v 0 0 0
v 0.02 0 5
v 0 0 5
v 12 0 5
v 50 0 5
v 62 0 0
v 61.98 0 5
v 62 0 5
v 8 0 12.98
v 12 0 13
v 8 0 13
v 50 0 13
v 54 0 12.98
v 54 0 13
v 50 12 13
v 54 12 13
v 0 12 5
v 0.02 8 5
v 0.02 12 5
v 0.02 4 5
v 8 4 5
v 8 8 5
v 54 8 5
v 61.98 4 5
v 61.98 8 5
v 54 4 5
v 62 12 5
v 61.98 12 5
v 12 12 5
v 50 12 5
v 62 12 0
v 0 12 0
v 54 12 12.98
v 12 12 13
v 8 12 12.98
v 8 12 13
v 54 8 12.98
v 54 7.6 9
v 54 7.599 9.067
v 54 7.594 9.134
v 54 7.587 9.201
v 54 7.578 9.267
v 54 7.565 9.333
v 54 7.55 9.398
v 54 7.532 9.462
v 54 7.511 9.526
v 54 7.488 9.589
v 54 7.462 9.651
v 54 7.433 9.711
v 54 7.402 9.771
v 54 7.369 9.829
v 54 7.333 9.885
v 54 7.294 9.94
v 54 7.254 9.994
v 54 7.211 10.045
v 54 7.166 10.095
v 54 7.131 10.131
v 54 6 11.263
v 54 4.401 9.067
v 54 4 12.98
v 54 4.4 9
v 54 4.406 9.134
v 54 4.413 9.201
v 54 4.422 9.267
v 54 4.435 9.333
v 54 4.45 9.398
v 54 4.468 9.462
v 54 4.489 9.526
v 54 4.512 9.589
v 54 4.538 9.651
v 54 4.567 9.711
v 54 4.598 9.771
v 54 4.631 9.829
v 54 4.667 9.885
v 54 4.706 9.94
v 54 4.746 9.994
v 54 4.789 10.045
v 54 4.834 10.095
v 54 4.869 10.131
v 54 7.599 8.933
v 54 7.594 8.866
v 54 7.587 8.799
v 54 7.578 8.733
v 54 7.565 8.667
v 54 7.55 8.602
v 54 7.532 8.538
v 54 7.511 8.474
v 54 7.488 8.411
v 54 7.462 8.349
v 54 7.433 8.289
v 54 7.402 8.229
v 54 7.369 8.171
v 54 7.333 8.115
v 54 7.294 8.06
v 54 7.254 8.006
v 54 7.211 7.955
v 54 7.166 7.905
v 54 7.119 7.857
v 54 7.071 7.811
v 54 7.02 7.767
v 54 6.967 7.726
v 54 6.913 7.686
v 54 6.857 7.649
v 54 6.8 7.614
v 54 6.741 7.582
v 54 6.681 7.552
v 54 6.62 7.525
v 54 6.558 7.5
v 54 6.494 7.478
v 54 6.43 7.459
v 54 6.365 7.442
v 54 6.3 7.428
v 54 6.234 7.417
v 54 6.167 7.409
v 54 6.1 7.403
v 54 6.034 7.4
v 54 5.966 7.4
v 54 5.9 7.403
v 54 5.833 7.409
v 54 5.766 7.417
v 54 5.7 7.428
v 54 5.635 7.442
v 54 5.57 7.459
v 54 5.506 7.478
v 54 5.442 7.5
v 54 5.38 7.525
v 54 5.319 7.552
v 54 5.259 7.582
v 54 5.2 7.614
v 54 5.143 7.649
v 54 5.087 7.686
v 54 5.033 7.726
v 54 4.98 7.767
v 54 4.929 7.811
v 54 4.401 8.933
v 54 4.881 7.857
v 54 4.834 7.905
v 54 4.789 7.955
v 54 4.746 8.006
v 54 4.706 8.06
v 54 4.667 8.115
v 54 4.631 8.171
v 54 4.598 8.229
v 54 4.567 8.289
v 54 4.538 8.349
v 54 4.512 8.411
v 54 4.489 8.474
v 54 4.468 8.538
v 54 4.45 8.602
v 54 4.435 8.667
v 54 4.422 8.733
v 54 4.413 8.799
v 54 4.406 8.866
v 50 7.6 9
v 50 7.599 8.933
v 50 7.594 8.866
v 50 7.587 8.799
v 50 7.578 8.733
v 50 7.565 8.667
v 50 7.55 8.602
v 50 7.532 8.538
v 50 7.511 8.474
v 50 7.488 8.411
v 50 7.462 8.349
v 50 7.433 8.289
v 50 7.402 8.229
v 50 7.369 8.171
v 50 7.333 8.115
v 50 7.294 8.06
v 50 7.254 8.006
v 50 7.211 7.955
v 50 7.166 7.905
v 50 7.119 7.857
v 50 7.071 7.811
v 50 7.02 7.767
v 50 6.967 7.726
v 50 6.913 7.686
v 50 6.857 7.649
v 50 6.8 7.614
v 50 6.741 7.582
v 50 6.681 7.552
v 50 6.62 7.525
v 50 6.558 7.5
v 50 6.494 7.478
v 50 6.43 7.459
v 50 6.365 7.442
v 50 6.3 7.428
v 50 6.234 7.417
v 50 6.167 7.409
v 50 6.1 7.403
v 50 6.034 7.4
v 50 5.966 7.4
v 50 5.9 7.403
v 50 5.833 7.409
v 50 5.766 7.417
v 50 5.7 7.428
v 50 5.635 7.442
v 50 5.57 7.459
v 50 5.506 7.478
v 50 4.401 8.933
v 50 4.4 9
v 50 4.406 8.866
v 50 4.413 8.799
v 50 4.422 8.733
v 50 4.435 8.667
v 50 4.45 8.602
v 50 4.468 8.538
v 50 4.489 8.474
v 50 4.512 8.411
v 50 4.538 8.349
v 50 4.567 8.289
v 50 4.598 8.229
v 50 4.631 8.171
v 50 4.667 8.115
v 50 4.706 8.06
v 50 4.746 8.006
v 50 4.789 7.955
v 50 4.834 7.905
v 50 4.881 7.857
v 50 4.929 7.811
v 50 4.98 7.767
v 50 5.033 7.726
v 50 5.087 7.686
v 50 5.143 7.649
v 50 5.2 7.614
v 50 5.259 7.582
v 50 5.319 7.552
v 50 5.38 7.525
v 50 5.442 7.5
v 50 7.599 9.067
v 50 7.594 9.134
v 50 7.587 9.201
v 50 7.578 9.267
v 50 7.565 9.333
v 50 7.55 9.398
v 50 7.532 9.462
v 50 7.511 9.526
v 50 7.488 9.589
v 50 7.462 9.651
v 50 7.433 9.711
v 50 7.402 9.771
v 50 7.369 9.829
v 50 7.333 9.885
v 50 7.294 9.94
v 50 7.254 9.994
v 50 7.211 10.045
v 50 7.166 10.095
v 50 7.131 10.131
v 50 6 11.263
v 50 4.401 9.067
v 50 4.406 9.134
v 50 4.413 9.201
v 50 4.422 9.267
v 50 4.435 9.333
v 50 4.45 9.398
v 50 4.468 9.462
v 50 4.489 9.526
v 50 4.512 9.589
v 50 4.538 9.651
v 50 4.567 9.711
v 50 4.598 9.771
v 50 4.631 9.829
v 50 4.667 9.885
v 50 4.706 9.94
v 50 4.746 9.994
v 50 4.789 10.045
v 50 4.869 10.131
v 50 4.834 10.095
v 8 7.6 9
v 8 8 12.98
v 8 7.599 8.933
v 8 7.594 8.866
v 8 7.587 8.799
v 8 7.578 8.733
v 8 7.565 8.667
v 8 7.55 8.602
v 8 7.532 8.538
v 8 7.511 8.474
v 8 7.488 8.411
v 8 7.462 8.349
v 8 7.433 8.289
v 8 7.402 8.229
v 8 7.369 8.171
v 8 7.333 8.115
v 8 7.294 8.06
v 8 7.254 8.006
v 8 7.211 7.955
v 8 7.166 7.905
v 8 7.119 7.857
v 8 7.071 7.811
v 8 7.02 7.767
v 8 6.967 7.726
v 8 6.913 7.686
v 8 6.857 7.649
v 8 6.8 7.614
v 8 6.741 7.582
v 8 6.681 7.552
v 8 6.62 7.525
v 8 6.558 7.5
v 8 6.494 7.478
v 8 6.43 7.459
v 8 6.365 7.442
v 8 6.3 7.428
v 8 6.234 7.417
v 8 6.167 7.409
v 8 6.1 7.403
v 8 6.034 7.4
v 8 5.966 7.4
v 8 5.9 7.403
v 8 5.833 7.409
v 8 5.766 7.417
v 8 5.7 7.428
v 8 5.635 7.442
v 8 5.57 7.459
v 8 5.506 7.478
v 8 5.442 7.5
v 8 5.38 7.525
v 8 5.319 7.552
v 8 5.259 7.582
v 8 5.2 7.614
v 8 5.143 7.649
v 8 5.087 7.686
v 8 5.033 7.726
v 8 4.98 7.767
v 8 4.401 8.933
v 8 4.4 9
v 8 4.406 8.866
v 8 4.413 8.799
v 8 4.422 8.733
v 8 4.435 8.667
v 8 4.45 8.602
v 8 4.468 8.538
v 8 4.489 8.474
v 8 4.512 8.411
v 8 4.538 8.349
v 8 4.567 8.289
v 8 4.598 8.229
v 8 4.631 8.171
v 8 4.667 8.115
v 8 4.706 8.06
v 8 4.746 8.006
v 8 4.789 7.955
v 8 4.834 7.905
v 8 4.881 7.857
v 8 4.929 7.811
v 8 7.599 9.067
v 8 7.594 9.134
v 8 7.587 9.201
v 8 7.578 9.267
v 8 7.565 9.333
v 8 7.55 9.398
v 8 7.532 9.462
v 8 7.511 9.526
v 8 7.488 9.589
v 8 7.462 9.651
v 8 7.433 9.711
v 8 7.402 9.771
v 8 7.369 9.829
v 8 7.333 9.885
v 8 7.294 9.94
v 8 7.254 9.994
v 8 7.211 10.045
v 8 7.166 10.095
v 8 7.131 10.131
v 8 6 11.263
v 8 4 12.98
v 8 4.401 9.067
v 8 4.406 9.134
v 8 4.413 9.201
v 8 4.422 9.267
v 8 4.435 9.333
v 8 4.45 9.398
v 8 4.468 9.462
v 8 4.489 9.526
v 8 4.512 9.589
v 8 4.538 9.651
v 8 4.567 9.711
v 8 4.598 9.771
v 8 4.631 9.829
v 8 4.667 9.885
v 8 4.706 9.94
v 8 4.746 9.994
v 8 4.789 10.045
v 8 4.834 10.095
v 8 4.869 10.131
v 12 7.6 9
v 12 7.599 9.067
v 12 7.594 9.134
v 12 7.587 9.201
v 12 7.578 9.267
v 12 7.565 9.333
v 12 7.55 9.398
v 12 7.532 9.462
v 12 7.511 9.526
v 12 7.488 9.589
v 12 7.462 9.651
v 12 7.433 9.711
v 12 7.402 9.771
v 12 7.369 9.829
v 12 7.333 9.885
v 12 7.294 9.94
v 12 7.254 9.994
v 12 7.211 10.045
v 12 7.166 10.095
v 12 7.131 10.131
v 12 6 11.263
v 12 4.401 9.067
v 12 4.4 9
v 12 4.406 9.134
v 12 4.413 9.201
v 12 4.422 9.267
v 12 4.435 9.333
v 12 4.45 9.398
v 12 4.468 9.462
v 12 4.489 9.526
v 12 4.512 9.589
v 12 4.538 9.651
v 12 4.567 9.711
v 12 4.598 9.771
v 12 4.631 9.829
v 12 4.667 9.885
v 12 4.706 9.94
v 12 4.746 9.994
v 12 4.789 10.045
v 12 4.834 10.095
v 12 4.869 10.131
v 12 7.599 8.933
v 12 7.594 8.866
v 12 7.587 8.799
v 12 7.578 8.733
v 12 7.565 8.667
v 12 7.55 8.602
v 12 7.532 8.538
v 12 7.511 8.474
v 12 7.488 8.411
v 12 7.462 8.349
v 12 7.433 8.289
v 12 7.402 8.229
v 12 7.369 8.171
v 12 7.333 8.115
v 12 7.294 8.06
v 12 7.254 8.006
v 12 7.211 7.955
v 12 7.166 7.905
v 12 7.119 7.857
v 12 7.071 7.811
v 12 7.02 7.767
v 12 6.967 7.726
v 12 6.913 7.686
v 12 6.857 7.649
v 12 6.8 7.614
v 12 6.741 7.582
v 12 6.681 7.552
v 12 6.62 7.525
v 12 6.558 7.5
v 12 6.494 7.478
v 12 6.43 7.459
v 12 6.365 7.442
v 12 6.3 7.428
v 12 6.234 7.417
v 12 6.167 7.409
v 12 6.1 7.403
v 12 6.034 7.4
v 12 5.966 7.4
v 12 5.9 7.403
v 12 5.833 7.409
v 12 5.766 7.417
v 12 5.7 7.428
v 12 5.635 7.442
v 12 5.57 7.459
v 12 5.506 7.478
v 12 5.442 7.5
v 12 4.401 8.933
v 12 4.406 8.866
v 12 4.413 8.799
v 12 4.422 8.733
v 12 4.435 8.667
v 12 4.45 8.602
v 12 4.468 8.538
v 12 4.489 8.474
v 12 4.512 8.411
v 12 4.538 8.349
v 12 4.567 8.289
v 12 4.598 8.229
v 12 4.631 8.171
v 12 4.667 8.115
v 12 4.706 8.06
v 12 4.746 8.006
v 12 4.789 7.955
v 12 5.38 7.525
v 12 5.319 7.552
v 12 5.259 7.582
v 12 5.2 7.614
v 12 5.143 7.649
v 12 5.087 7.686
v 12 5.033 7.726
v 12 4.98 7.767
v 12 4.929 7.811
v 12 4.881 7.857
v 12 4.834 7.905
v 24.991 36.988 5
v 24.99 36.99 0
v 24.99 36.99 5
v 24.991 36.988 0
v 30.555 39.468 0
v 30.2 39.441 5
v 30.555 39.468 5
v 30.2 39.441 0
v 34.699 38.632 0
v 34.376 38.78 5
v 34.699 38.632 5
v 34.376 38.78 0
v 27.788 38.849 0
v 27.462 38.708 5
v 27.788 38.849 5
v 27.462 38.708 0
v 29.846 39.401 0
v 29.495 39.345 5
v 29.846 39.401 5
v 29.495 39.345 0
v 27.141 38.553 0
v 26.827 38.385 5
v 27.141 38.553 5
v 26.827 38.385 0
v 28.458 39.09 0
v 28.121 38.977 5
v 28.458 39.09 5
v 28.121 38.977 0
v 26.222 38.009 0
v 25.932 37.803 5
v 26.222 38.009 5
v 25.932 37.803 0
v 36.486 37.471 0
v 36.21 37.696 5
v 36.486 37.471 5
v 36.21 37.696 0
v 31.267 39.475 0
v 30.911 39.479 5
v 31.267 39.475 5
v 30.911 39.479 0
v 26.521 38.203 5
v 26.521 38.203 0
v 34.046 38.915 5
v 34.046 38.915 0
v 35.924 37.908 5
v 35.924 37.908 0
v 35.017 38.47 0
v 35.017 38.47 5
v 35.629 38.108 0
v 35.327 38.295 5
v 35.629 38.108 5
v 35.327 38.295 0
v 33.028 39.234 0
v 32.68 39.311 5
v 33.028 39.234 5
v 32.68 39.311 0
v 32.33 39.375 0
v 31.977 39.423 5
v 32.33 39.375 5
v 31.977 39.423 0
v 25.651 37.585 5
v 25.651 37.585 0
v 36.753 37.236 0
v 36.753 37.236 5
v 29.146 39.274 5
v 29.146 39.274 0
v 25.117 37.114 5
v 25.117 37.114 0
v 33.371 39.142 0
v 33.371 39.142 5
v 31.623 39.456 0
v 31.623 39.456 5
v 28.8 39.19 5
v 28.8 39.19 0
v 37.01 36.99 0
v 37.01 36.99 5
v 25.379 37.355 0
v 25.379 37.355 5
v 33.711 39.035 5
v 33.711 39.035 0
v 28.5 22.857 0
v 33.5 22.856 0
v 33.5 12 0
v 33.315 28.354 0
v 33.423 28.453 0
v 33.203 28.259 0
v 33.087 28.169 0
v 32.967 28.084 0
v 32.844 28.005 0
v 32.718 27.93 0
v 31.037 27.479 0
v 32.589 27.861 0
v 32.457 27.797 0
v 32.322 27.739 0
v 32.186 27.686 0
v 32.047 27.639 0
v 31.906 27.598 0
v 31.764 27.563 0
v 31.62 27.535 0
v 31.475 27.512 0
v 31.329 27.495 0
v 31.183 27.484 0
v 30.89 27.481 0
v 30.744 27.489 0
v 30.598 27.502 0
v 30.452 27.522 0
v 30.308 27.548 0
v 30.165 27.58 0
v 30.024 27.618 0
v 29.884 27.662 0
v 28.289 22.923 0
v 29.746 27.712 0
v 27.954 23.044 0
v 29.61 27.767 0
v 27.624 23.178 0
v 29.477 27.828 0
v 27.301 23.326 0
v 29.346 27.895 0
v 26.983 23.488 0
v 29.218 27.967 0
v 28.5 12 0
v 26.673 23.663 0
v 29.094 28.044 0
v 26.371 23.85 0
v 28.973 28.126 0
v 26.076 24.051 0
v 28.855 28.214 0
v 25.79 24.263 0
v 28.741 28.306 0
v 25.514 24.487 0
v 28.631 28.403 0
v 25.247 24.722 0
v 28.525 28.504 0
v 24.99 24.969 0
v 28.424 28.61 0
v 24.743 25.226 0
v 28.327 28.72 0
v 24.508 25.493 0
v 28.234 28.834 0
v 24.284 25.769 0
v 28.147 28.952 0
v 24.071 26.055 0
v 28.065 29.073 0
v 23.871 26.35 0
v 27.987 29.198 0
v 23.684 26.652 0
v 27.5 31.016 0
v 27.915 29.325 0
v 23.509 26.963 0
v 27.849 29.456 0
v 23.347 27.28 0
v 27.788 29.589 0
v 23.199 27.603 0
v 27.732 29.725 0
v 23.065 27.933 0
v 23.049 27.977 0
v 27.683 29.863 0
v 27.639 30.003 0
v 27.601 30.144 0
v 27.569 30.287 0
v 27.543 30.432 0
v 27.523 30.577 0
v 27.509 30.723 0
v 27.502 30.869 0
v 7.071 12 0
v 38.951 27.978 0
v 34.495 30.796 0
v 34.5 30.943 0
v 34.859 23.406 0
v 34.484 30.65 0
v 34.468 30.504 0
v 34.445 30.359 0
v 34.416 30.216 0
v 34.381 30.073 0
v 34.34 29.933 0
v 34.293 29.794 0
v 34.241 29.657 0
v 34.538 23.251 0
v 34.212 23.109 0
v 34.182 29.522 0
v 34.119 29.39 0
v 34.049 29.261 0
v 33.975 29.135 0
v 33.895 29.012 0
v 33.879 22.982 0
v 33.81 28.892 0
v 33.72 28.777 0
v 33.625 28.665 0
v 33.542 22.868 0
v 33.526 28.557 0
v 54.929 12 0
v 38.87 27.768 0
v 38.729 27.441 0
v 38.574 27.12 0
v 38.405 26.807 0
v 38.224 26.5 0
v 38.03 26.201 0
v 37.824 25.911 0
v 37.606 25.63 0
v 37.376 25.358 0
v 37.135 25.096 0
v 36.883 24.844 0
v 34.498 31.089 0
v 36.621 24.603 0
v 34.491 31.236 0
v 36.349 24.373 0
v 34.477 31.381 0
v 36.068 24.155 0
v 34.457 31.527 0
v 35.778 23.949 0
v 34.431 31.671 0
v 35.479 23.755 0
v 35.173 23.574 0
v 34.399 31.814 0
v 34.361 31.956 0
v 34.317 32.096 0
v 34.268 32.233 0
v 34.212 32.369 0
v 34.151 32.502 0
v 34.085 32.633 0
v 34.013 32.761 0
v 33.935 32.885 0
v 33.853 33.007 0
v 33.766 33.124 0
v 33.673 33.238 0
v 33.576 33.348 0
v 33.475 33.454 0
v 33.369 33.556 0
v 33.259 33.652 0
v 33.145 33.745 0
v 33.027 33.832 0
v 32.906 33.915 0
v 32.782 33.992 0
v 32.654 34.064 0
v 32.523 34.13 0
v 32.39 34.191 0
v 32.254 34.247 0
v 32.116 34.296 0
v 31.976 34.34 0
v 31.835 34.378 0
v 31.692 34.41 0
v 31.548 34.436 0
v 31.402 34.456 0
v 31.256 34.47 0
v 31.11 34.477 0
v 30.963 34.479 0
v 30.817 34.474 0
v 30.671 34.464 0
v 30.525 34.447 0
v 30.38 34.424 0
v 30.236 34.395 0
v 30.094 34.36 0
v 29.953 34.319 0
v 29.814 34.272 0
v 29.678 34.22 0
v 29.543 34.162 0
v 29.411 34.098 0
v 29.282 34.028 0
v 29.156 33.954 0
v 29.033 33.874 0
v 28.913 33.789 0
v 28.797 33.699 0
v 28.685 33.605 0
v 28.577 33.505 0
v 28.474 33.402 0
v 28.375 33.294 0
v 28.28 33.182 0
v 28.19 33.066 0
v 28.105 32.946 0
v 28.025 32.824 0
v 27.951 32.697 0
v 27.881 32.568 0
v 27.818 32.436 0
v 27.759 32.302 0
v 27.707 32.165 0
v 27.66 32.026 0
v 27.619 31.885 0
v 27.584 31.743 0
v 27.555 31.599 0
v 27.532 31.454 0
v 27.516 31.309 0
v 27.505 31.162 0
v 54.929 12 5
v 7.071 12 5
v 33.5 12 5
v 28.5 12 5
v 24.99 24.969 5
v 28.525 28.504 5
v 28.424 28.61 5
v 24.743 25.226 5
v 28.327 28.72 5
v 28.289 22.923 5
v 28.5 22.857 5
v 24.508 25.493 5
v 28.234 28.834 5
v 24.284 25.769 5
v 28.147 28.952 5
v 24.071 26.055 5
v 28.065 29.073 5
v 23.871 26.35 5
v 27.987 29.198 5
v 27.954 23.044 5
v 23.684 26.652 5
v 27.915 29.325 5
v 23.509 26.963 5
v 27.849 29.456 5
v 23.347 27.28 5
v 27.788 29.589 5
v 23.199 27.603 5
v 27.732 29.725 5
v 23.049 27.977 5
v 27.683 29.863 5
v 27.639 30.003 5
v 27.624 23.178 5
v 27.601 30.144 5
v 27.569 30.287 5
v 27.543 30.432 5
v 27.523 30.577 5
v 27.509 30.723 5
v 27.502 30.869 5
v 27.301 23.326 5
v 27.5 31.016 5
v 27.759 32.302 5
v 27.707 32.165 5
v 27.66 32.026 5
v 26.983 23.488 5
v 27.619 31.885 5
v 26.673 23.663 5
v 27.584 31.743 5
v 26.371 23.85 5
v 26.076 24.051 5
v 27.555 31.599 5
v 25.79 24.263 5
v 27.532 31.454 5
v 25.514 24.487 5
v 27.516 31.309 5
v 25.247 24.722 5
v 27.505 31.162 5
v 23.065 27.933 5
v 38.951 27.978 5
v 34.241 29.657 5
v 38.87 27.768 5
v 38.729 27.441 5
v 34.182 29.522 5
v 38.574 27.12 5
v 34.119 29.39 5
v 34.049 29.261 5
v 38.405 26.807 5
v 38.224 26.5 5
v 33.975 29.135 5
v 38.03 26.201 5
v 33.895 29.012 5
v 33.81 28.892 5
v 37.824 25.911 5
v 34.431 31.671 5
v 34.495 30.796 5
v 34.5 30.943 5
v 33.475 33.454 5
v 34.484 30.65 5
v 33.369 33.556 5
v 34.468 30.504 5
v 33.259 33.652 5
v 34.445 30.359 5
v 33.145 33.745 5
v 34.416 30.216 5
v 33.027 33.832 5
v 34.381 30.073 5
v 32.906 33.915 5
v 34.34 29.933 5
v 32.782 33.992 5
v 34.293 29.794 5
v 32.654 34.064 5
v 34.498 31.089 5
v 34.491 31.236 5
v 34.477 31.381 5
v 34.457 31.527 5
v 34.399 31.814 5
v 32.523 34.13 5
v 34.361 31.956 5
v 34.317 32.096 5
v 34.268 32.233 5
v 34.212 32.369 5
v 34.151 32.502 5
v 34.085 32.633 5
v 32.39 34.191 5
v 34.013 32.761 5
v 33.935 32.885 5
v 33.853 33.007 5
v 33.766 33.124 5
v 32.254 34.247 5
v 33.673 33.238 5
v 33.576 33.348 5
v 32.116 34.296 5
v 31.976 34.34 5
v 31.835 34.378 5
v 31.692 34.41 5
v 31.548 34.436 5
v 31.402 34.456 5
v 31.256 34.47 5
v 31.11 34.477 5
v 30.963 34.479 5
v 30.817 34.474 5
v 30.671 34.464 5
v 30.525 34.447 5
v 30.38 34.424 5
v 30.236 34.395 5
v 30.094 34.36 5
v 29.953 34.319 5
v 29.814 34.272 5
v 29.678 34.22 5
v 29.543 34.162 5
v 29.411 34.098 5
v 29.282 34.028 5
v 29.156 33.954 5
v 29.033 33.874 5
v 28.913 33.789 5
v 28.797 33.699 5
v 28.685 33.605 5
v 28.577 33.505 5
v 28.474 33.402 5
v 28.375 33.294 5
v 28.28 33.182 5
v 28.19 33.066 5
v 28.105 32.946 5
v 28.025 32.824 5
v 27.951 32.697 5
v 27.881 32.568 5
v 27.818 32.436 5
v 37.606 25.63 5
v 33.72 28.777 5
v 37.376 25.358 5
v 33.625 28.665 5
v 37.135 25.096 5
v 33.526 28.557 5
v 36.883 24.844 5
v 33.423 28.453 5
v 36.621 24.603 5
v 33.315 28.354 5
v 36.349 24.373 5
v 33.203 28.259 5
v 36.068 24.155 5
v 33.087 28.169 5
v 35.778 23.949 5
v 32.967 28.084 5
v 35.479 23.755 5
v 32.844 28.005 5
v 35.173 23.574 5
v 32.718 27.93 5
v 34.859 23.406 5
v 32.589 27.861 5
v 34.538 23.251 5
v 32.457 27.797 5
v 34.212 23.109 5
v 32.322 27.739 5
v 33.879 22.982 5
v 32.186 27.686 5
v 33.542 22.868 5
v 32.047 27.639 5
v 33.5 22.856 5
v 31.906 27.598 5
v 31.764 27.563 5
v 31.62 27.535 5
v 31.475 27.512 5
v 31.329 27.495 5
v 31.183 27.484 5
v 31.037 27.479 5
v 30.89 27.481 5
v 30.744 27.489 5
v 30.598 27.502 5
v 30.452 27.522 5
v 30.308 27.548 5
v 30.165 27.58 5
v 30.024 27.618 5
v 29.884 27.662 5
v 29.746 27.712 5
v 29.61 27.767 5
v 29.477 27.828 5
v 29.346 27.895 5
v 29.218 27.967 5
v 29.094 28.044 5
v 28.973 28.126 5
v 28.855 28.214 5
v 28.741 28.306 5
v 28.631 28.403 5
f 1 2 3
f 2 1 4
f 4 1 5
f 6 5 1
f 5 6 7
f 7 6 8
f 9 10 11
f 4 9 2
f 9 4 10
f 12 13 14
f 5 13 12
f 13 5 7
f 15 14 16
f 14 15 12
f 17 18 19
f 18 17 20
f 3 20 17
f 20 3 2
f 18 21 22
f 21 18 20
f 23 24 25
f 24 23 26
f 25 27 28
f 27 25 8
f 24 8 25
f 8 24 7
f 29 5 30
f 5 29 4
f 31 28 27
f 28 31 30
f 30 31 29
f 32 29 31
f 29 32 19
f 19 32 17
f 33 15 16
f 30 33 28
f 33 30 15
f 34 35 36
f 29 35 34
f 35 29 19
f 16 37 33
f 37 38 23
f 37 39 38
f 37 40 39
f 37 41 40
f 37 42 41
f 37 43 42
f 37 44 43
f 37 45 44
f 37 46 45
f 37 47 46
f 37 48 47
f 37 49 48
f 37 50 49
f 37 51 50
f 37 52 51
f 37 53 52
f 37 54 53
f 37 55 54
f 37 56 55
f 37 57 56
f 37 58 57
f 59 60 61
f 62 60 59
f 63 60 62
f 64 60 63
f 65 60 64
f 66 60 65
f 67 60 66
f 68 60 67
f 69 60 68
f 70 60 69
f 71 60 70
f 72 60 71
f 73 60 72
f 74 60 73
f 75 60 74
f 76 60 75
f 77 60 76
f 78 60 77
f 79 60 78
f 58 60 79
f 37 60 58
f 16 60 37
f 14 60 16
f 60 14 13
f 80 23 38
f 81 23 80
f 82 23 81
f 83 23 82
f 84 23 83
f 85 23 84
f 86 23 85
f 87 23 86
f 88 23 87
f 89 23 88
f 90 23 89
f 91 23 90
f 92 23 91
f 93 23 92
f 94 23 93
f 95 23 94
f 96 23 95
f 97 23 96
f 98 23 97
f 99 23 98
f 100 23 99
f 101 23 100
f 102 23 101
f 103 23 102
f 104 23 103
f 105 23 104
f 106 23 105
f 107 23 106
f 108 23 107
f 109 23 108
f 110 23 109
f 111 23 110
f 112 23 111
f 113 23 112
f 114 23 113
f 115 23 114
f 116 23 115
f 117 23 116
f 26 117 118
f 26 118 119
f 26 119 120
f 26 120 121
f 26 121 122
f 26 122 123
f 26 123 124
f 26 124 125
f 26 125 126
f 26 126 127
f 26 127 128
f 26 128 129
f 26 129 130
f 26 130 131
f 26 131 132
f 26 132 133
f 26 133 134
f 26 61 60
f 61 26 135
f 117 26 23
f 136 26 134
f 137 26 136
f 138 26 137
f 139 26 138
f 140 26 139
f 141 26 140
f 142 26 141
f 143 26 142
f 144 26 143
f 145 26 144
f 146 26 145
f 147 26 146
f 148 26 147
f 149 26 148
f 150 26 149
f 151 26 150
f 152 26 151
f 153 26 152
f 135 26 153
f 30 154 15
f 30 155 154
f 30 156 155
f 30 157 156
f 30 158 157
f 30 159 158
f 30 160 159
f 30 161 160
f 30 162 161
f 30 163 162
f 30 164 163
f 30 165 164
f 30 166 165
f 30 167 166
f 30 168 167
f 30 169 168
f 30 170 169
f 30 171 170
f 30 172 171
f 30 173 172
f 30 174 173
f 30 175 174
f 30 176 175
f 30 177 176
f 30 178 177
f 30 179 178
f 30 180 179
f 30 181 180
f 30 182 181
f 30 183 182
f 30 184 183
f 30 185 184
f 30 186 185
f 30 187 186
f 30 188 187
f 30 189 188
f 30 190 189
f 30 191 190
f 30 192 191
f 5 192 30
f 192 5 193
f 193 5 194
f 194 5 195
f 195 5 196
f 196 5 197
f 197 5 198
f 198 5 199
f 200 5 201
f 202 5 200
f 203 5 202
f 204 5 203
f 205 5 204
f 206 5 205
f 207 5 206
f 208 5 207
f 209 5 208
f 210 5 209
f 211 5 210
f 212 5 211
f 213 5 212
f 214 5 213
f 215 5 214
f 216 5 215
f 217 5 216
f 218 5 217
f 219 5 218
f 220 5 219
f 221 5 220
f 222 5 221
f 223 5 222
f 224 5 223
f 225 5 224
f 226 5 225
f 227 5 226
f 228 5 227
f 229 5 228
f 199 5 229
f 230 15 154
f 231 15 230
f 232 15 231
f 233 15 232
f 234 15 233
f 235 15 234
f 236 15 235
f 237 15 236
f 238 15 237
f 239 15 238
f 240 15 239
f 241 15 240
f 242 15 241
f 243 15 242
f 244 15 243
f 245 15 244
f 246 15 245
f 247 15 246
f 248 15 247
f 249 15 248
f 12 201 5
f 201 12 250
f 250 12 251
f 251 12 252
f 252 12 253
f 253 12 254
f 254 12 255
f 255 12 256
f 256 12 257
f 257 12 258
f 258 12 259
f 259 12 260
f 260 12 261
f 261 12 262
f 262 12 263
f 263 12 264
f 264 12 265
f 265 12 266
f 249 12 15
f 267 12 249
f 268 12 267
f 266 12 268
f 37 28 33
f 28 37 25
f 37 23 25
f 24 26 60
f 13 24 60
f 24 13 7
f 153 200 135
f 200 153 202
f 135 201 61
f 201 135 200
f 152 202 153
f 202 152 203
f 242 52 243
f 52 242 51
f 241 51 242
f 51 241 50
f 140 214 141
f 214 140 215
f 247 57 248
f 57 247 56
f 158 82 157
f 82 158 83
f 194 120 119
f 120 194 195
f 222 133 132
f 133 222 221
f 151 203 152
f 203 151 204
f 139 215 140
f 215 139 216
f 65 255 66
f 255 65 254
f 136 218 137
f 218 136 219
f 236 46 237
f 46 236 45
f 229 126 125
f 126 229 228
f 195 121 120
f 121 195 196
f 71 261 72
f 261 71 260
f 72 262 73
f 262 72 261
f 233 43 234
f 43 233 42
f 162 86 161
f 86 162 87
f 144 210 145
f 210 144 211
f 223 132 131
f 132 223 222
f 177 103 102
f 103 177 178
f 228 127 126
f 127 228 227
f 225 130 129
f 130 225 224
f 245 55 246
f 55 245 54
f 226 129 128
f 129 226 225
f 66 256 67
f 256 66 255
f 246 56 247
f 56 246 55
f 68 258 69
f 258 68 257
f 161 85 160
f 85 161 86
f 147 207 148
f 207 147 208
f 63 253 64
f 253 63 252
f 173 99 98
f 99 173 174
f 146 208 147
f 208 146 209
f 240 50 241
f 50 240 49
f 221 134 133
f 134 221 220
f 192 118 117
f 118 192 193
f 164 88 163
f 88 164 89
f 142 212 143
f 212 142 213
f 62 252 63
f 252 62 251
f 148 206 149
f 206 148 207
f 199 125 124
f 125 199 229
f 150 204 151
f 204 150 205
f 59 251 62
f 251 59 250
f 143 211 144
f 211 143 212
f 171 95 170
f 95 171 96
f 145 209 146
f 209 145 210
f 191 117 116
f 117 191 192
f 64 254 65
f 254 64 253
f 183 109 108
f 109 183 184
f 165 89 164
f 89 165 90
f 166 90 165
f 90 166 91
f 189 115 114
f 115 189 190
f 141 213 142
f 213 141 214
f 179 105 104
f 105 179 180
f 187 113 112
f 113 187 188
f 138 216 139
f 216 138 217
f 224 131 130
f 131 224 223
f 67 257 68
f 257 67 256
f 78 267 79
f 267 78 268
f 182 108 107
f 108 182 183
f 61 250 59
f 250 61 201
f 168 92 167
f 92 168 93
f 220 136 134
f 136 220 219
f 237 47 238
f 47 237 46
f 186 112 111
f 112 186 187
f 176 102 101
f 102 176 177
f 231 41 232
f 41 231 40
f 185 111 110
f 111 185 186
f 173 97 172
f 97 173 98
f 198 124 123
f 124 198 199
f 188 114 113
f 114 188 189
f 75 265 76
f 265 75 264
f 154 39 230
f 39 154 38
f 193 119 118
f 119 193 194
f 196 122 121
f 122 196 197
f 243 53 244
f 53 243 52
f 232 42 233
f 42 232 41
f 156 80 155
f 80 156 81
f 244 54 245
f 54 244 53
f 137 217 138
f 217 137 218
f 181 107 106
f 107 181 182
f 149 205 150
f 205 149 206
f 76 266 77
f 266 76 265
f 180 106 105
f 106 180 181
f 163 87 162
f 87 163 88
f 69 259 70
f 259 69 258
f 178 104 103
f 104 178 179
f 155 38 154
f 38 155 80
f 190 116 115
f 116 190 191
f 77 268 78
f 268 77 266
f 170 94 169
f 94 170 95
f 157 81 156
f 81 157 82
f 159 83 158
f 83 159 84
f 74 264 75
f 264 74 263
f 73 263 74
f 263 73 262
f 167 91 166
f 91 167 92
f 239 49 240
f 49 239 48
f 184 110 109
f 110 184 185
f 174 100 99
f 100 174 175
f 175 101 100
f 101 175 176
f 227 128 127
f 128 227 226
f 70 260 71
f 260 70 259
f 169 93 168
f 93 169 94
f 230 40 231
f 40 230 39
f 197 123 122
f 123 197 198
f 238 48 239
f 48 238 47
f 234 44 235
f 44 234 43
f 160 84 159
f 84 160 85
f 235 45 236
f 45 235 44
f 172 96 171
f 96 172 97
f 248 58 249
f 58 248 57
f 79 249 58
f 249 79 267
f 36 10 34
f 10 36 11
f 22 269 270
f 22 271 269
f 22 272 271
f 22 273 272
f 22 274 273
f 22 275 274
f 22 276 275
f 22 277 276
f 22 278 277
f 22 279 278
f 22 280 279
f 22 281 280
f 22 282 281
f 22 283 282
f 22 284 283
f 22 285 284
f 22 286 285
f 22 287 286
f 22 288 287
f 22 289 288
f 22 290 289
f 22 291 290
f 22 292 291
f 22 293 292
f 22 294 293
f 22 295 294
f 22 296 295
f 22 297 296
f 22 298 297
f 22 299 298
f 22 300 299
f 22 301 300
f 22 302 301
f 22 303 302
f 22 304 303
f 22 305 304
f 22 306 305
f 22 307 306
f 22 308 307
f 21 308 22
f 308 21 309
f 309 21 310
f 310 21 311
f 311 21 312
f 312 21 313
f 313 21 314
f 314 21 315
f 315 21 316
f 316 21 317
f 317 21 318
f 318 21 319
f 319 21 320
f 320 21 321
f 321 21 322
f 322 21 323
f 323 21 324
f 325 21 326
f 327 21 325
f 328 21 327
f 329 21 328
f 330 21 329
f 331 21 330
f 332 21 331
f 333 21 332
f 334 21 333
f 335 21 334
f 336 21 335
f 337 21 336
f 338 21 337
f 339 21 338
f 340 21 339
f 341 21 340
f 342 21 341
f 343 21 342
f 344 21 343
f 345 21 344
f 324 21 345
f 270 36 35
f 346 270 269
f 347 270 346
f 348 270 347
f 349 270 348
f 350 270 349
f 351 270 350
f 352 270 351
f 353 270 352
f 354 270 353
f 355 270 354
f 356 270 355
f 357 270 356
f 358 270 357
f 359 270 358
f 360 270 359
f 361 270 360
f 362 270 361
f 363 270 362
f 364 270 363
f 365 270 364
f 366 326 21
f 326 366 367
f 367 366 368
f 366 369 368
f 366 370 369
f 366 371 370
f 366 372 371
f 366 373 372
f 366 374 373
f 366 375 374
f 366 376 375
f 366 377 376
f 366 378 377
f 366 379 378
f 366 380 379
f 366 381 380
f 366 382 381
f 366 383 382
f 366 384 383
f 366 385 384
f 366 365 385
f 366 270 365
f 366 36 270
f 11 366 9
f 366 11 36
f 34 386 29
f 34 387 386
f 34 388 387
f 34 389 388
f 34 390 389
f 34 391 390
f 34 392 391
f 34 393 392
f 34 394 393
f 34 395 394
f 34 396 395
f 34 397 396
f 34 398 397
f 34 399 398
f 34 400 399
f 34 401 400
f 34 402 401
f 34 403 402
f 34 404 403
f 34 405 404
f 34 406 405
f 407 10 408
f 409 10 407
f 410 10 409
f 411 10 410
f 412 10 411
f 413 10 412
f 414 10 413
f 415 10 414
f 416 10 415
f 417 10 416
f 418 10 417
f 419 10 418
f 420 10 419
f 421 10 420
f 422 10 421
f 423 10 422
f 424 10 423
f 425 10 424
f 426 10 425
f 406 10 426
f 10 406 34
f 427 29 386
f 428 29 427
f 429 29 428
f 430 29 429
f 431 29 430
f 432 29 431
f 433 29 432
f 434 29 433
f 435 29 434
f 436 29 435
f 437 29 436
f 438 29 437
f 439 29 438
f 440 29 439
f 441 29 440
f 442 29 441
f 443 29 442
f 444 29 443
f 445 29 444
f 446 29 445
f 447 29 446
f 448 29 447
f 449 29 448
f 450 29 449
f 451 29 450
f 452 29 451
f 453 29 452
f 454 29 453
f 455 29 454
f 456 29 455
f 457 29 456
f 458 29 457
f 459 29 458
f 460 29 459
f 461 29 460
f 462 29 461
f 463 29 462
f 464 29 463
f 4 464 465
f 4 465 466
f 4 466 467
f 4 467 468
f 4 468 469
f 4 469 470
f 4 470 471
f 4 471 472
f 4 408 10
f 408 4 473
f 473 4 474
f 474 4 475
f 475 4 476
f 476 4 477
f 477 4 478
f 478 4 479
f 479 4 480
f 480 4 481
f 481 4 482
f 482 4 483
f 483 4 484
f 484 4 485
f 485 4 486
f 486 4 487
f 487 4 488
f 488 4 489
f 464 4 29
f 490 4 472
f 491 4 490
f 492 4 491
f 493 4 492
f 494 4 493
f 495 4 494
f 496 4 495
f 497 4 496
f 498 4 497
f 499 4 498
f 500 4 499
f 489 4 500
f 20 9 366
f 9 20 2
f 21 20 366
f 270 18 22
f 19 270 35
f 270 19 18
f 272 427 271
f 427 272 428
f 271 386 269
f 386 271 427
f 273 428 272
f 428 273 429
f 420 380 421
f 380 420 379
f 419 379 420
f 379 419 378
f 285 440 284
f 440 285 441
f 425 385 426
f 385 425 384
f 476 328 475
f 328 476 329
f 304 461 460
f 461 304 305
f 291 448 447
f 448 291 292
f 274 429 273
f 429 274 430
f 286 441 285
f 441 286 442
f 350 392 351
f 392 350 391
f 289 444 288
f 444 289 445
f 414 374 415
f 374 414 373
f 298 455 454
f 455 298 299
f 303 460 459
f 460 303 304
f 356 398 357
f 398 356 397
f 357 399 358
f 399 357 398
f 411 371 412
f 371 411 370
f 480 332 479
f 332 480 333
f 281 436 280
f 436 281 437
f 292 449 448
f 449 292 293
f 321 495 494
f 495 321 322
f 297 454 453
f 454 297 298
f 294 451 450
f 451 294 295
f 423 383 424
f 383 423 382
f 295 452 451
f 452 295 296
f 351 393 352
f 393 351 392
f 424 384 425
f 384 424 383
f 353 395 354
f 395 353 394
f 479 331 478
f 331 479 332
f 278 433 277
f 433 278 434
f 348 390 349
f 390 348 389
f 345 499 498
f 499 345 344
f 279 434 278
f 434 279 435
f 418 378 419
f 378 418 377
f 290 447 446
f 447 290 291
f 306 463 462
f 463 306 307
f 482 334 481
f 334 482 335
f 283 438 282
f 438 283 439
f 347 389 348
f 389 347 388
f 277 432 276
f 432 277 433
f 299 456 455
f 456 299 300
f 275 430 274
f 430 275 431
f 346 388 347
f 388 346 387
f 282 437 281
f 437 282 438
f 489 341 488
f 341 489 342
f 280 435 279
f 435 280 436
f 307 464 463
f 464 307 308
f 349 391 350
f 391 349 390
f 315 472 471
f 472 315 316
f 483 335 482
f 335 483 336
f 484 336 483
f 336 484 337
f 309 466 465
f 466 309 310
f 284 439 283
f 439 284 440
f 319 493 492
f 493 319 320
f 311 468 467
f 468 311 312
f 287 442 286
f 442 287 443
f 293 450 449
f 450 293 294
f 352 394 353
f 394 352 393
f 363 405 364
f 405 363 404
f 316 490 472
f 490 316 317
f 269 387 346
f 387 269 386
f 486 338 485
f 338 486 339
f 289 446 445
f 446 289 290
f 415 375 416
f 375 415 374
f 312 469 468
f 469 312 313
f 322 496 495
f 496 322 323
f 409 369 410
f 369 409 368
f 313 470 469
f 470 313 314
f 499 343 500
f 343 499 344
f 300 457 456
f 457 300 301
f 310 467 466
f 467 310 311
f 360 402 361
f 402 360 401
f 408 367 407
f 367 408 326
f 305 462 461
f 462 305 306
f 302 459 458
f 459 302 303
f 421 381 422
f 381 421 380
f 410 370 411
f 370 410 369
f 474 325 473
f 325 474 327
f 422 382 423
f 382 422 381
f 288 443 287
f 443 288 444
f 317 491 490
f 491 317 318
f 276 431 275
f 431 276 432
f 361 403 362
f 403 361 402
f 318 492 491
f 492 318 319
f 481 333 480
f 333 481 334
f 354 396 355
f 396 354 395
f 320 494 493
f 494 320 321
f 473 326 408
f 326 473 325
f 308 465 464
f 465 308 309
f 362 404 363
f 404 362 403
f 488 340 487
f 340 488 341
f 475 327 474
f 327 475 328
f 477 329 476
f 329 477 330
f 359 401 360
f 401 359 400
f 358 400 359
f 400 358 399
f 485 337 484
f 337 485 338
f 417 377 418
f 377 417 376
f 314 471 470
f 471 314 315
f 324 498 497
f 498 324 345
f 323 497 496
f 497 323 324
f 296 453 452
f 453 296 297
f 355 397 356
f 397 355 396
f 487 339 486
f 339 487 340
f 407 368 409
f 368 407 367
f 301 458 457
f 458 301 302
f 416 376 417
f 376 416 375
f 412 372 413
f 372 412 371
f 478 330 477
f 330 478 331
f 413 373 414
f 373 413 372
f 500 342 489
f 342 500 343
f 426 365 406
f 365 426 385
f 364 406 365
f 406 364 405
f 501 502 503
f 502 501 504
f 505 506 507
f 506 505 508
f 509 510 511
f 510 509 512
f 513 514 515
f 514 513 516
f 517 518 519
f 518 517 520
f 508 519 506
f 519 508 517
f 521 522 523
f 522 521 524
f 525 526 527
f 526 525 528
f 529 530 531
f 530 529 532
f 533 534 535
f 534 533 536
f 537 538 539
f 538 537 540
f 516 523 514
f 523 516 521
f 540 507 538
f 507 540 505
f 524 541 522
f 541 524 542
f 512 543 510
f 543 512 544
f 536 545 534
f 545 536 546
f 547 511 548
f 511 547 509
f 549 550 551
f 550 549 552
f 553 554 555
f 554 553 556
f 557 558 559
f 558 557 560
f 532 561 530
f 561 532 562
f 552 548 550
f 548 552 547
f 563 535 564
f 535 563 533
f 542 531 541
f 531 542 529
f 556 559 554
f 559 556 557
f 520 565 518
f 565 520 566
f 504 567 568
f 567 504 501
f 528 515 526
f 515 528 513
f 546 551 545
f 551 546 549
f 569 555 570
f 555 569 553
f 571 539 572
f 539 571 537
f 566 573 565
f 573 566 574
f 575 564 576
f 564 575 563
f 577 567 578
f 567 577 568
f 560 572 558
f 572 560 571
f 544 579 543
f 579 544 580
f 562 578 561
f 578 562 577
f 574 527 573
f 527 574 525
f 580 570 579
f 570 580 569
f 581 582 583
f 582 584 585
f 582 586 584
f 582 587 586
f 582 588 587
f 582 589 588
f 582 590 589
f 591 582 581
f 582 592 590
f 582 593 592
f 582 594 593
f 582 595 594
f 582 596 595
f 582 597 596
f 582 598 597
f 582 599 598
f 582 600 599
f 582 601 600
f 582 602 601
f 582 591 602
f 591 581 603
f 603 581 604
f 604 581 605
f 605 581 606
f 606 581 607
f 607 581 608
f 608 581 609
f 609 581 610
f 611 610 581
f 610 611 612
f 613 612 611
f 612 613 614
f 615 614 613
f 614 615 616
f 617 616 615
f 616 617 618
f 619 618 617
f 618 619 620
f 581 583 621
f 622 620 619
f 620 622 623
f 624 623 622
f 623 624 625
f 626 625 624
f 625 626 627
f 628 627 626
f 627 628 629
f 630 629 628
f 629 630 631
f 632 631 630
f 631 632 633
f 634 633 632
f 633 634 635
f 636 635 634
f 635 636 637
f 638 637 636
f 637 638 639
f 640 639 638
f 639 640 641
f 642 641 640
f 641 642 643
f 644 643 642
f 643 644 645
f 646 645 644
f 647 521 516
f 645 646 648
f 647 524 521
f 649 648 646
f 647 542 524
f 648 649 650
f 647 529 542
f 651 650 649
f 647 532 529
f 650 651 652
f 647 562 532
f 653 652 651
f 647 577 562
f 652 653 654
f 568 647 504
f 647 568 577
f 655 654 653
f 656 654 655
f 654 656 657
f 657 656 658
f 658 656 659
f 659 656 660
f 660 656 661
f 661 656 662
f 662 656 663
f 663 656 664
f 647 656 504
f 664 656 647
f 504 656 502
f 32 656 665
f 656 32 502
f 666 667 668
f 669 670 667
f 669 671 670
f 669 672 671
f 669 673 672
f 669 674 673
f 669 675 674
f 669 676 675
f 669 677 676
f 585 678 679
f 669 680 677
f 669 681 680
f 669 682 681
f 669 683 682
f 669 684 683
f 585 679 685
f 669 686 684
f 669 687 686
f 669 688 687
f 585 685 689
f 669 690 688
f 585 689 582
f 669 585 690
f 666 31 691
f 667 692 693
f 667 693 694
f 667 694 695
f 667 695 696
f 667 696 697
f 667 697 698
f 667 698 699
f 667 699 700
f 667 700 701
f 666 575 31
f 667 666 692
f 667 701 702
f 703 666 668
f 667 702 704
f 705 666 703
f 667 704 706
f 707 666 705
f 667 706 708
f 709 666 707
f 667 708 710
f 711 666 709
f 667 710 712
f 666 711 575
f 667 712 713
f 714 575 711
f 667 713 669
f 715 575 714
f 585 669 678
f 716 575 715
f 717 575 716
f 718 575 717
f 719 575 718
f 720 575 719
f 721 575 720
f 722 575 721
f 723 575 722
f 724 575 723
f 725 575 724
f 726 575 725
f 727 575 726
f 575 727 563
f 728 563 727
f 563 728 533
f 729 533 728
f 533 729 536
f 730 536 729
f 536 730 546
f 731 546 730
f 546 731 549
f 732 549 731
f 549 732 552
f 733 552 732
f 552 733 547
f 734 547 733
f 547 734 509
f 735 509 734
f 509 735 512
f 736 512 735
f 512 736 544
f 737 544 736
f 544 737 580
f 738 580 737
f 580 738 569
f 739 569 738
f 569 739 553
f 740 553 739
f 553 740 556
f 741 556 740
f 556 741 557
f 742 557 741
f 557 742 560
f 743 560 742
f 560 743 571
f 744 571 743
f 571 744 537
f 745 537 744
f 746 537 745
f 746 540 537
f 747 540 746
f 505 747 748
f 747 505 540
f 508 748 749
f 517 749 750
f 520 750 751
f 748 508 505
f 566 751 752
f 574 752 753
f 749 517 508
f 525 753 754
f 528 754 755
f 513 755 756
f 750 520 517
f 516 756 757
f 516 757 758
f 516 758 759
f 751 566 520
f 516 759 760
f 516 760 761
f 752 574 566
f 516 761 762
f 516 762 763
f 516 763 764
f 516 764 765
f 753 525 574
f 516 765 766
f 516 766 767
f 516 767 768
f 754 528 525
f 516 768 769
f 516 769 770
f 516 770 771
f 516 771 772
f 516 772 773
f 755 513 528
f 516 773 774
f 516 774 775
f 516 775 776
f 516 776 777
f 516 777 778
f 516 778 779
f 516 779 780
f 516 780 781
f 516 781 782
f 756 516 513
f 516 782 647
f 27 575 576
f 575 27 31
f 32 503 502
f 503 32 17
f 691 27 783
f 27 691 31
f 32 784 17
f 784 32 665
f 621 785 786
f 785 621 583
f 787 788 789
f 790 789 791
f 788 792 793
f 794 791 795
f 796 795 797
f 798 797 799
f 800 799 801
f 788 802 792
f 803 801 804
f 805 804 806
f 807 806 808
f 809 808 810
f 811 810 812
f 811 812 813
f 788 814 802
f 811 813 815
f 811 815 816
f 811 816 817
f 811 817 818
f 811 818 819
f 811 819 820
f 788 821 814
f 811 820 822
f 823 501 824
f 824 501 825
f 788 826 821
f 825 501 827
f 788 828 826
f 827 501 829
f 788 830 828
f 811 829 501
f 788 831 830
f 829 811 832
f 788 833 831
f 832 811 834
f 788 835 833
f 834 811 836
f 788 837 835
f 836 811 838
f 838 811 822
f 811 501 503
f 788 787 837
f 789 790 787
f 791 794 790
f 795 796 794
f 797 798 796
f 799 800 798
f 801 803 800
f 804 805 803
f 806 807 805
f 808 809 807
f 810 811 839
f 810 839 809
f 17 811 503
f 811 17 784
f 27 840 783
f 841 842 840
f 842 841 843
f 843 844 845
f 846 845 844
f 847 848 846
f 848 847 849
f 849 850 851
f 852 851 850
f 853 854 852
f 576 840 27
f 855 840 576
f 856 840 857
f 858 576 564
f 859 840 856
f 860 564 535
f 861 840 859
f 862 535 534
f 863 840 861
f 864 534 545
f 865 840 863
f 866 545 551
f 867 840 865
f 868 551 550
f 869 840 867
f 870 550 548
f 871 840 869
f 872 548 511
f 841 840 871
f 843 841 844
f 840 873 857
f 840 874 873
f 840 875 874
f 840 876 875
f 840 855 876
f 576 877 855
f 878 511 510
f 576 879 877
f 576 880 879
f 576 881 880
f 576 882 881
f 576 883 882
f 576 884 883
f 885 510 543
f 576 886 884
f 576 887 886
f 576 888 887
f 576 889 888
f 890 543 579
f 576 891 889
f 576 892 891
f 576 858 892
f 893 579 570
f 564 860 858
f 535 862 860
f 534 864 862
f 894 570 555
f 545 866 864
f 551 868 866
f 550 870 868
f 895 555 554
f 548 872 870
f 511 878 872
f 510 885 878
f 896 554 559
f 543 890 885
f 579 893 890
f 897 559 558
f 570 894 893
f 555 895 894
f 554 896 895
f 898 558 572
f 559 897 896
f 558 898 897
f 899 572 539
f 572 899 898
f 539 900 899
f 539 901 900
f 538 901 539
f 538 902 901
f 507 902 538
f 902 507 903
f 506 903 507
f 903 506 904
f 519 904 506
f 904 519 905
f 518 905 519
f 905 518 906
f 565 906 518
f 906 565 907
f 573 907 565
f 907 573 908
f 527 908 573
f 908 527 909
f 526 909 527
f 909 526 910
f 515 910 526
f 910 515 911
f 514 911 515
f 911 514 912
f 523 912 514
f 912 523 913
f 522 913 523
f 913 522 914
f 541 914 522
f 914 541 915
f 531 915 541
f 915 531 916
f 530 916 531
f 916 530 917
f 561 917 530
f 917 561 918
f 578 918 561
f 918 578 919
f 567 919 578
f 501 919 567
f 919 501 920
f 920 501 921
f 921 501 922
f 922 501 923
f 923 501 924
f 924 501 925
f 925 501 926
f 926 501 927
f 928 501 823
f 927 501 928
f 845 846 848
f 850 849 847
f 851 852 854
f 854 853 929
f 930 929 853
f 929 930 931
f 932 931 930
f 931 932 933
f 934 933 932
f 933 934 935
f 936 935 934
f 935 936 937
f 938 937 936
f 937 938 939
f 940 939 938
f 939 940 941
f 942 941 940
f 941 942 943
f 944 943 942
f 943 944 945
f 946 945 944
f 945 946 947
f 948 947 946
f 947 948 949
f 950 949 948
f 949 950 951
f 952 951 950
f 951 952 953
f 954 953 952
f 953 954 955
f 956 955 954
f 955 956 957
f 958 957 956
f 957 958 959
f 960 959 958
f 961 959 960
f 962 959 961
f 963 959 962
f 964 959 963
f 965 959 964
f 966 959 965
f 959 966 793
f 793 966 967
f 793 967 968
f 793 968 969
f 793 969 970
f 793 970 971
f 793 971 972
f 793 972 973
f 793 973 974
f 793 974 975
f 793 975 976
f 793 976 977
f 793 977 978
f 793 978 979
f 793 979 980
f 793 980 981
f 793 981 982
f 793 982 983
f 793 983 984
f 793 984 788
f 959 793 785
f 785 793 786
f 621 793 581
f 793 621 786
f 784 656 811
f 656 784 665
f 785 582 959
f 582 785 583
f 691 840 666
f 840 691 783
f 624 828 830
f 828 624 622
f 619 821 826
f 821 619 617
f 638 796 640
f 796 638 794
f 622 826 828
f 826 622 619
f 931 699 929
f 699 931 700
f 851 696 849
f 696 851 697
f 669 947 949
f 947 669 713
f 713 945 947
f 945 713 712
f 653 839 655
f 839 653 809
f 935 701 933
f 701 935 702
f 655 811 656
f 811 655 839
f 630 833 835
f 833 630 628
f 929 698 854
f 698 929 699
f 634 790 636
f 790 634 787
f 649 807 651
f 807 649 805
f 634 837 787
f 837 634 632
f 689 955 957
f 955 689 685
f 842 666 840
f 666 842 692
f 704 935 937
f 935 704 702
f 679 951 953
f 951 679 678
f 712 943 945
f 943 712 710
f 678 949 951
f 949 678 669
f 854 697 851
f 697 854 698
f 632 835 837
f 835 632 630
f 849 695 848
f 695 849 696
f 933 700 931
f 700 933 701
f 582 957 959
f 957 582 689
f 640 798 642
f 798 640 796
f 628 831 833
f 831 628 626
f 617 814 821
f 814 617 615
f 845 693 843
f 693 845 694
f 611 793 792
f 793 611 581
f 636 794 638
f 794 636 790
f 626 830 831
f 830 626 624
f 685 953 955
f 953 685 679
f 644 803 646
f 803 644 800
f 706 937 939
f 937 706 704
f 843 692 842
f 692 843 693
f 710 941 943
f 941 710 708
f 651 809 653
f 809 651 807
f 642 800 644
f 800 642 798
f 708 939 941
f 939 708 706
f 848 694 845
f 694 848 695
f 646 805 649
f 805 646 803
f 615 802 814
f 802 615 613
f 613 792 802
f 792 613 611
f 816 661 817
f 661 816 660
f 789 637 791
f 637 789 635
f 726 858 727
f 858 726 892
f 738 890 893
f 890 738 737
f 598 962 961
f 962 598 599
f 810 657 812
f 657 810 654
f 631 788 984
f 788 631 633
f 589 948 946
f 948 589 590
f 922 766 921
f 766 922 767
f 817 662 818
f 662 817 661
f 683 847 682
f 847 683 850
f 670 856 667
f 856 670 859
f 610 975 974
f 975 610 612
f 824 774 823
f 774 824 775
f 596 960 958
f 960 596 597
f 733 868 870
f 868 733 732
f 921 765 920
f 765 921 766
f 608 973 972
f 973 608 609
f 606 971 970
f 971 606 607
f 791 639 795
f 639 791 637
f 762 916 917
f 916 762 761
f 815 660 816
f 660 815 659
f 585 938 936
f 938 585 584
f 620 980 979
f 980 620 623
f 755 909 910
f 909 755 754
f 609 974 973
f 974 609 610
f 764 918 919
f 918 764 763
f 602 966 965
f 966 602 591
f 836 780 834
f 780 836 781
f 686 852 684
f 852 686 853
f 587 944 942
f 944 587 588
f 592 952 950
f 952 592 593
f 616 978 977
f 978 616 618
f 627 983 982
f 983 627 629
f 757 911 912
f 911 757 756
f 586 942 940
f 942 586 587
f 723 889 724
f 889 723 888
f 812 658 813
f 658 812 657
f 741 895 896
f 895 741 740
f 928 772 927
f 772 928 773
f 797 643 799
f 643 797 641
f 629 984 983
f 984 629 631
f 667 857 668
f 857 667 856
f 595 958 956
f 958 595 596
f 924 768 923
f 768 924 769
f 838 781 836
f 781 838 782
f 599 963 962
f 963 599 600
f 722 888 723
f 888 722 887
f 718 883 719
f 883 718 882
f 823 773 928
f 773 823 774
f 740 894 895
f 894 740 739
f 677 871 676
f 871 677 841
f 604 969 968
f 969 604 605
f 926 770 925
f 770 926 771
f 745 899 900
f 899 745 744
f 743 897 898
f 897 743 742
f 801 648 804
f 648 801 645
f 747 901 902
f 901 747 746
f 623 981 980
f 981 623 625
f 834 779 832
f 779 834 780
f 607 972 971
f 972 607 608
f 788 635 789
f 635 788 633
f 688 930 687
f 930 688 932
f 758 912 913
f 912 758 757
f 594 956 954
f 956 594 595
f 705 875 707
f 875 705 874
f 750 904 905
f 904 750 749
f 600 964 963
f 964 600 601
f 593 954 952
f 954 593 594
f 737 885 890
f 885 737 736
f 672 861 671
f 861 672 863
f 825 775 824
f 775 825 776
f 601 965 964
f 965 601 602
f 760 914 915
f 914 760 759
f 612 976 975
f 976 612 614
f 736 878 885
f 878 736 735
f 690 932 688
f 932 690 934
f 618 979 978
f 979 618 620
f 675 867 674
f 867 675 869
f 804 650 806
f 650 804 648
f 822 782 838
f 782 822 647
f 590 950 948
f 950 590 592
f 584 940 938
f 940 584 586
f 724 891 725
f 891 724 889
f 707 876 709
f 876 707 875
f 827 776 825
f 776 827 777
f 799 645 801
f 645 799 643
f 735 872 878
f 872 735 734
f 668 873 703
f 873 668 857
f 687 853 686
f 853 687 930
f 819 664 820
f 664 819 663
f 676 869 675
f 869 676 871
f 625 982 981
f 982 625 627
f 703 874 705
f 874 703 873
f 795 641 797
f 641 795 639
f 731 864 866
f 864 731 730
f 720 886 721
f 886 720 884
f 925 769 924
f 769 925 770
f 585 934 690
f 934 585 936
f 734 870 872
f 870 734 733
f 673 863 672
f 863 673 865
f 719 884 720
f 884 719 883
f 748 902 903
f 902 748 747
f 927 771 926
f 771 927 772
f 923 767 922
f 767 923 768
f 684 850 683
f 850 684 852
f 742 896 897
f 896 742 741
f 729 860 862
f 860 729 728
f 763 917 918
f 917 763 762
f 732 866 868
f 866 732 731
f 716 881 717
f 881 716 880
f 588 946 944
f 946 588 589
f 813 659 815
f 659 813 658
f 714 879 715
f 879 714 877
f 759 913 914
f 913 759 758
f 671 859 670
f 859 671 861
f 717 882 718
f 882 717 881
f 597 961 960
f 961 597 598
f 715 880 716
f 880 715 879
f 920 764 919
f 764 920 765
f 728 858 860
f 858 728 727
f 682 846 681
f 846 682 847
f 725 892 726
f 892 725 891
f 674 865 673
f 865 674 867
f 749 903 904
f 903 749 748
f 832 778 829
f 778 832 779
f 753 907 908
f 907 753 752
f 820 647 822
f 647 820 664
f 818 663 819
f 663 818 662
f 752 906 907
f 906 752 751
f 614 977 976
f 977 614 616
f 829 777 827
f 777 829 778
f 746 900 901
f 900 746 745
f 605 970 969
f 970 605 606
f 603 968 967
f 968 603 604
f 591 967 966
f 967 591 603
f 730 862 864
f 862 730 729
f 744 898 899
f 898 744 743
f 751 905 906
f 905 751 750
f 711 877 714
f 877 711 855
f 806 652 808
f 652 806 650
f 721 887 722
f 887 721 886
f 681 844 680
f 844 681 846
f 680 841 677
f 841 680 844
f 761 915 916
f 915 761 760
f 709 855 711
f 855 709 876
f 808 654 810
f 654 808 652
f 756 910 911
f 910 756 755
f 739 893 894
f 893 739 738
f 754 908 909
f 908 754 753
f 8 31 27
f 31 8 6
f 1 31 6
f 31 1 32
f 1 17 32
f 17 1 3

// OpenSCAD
/*
  Festoon LED socket design
  Copyright (C) 2013 Vasilis Tsiligiannis <acinonyx@openwrt.gr>

  This program is free software: you can redistribute it and/or modify
  it under the terms of the GNU General Public License as published by
  the Free Software Foundation, either version 3 of the License, or
  (at your option) any later version.

  This program is distributed in the hope that it will be useful,
  but WITHOUT ANY WARRANTY; without even the implied warranty of
  MERCHANTABILITY or FITNESS FOR A PARTICULAR PURPOSE.  See the
  GNU General Public License for more details.

  You should have received a copy of the GNU General Public License
  along with this program.  If not, see <http://www.gnu.org/licenses/>.
  Also add information on how to contact you by electronic and paper mail.
*/

$fn = 150;
accuracy = .01;

// LED parameters
bulb_width = 39;
bulb_diameter = 12;

// Spacer parameters
spacer_height = 7.45;
spacer_width = 4;
spacer_m = 3;
spacer_hole = 1;

// Stand parameters
stand_thick = 4;
stand_height = spacer_width + 4;
stand_width = spacer_width + stand_thick * 2;
stand_hole_m = spacer_m + 0.2;
stand_hole_pos = stand_height - 2 - spacer_width / 2;

// Base parameters
base_hole_m = 7;
base_hole_thick = 5;
base_length = bulb_width - 1 + (stand_height + stand_thick) * 2;
base_width = bulb_diameter;
base_thick = 5;

// Do not edit bellow

base (base_length,
      base_width,
      base_thick,
      base_hole_m,
      base_hole_thick,
      stand_width,
      stand_height,
      stand_thick,
      stand_hole_m,
      stand_hole_pos);

module spacer (width, height, m, hole) {
    difference () {
        cube ([width, width, height]);
        translate ([width / 2, width / 2, 0])
            cylinder (h = height, r = m / 2);
        translate ([width / 2, 0, height * 2 / 3])
            rotate ([-90, 0, 0])
	    cylinder (h = width, r = hole / 2);
    }
}

module stand_sup (width, height, thick) {
    translate ([0, thick, 0])
        rotate ([90, 0, 0])
	ortho_triangle (thick, width, height);
}

module stand (width, height, thick, hole_m, hole_pos) {
    difference () {
	union () {
	    cube ([width, thick, height]);

	    translate ([thick, thick - accuracy, -accuracy])
		rotate ([0, 0, 90])
                stand_sup (height, height, thick);
	    translate ([width, thick - accuracy, -accuracy])
		rotate ([0, 0, 90])
                stand_sup (height, height, thick);
		
	}
	translate ([width / 2, -thick / 2, hole_pos])
	    teardrop (thick * 2, hole_m / 2);
    }
}

module teardrop (height, radius) {
    rotate ([-90, 0, 0])
        union () {
	cylinder (h = height, r = radius);
	rotate ([0, 0, -135])
            cube ([radius, radius, height]);
    }
}
    
module base (length,
             width,
	     thick,
	     hole_m,
	     hole_thick,
             stand_width,
	     stand_height,
	     stand_thick,
	     stand_hole_m,
	     stand_hole_pos
    ) {

    union () {
        cube ([length, width, thick]);
        translate ([length - stand_height - stand_thick, stand_width / 2 + width / 2, thick])
            rotate ([0, 0, -90])
	    stand (stand_width, stand_height, stand_thick, stand_hole_m, stand_hole_pos);
        translate ([stand_height + stand_thick, -stand_width / 2 + width / 2, thick])
            rotate ([0, 0, 90])
	    stand (stand_width, stand_height, stand_thick, stand_hole_m, stand_hole_pos);
        translate ([0, width, 0])
	    rotate ([0, 0, -135])
	    translate ([-length / sqrt(2), 0, 0])
	    difference () {
	    union () {
		difference () {
		    ortho_triangle (thick, length / sqrt(2), length / sqrt(2));
		    translate ([0, 0, -thick / 2])
			fillet (thick * 2, hole_thick + hole_m / 2);
		    rotate ([0, 0, -135])
			translate ([-length / 2, hole_thick / 2, -thick / 2])
			ortho_triangle (thick * 2, length / 2 - hole_thick / 2 - sqrt(2) * hole_thick, length / 2 - hole_thick / 2 - sqrt(2) * hole_thick);
		    rotate ([0, 0, 135])
			translate ([hole_thick / 2, -length / 2, -thick / 2])
			ortho_triangle (thick * 2, length / 2 - hole_thick / 2 - sqrt(2) * hole_thick, length / 2 - hole_thick / 2 - sqrt(2) * hole_thick);
		}
		translate ([hole_thick + hole_m / 2, hole_thick + hole_m / 2, 0])
		    cylinder (h = thick, r = hole_thick + hole_m / 2);
	    }
	    translate ([hole_thick + hole_m / 2, hole_thick + hole_m / 2, -thick / 2])
		cylinder (h = thick * 2, r = hole_m / 2);
	}

    }

}

module fillet (height, r) {
    difference () {
        translate ([-accuracy, -accuracy, 0])
            cube ([r + accuracy, r + accuracy, height]);
        translate ([r, r, -height / 2])
            cylinder (h = height * 2, r = r);
    }
}

module ortho_triangle (h, x, y) {
    polyhedron (points = [[0, 0, 0], [ 0, y, 0], [ x, 0, 0],
                          [0, 0, h], [ 0, y, h], [ x, 0, h]],
                triangles = [[0, 2, 1], [3, 4, 5],
                             [0, 5, 2], [5, 0, 3],
                             [0, 1, 3], [3, 1, 4],
                             [1, 2, 5], [1, 5, 4]]);
}
